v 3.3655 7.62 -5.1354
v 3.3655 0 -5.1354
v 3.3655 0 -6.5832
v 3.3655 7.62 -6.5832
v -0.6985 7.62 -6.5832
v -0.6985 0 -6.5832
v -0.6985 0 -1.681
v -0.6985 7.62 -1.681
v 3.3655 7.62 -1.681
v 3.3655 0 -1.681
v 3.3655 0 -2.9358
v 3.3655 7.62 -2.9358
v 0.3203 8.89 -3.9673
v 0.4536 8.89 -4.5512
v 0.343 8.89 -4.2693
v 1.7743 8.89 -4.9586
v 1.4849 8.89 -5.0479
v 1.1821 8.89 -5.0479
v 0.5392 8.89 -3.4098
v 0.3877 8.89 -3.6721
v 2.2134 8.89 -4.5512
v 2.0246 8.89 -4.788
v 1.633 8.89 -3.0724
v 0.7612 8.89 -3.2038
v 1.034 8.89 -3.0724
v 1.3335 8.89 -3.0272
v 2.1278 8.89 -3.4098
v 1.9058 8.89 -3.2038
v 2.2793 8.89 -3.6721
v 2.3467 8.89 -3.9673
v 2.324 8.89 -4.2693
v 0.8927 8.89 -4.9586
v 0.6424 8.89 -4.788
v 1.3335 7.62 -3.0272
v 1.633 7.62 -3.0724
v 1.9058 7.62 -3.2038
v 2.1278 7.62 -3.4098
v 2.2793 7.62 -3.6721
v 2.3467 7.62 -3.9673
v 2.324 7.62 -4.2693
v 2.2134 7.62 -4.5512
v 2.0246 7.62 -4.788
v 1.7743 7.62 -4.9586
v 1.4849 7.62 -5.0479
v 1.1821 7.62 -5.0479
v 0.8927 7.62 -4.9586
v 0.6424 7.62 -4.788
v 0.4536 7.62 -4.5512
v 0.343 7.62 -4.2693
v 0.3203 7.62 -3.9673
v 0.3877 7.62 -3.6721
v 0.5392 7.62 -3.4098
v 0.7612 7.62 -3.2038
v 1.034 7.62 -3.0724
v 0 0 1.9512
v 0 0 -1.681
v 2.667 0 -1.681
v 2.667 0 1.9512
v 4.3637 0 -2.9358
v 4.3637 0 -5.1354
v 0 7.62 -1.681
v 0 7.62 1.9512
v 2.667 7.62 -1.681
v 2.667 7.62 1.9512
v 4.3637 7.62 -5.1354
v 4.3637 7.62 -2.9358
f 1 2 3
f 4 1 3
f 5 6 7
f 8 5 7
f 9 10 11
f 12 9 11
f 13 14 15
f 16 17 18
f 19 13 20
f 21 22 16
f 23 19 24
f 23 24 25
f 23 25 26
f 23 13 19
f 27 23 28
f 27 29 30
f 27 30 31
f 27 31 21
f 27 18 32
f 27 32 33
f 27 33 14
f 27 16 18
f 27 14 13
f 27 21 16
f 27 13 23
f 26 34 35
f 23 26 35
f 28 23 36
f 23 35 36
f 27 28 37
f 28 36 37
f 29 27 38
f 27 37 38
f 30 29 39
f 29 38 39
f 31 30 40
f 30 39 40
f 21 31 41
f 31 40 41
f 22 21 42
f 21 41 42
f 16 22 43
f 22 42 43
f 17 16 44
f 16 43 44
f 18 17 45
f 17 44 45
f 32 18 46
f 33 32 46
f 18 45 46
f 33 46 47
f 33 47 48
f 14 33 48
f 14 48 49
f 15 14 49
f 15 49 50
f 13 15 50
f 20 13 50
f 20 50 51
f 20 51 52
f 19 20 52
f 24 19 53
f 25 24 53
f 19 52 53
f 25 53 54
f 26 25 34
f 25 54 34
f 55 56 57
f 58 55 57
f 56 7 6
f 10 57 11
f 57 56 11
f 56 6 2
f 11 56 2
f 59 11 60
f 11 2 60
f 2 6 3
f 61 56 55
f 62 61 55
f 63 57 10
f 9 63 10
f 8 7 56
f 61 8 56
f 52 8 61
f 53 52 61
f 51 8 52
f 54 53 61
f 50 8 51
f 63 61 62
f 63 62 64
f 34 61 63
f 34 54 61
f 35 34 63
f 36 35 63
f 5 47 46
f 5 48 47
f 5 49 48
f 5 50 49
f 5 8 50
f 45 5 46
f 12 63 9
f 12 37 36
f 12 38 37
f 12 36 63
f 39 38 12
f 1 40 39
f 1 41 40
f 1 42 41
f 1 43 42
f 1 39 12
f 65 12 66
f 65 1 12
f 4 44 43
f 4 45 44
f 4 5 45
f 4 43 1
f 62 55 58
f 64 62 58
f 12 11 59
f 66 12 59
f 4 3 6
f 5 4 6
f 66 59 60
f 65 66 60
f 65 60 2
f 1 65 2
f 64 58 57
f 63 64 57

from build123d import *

# Parameters (mm, degrees)
BOSS_EXTRUDE1_DEPTH = 7.62
SKETCH2_R           = 1.016
BOSS_EXTRUDE2_DEPTH = 1.27


with BuildPart() as part:
    # Sketch1 → Boss-Extrude1 (new body)
    with BuildSketch(Plane(origin=(0, 0, 0), x_dir=(1, 0, 0), z_dir=(0, 1, 0))):
        Polygon((0, 1.681040649), (0, 0), (0, -1.951159351), (2.667, -1.951159351), (2.667, 1.681040649), (3.3655, 1.681040649), (3.3655, 2.935800649), (4.36372, 2.935800649), (4.36372, 5.135440649), (3.3655, 5.135440649), (3.3655, 6.583240649), (-0.6985, 6.583240649), (-0.6985, 1.681040649), align=None)
    extrude(amount=BOSS_EXTRUDE1_DEPTH)

    # Sketch2 → Boss-Extrude2 (add)
    with BuildSketch(Plane(origin=(0, 7.62, 0), x_dir=(1, 0, 0), z_dir=(0, 1, 0))):
        with Locations(Location((1.3335, 4.043240649, 0), (0, 0, 270))):
            Circle(SKETCH2_R)
    extrude(amount=BOSS_EXTRUDE2_DEPTH)


solid = part.part
